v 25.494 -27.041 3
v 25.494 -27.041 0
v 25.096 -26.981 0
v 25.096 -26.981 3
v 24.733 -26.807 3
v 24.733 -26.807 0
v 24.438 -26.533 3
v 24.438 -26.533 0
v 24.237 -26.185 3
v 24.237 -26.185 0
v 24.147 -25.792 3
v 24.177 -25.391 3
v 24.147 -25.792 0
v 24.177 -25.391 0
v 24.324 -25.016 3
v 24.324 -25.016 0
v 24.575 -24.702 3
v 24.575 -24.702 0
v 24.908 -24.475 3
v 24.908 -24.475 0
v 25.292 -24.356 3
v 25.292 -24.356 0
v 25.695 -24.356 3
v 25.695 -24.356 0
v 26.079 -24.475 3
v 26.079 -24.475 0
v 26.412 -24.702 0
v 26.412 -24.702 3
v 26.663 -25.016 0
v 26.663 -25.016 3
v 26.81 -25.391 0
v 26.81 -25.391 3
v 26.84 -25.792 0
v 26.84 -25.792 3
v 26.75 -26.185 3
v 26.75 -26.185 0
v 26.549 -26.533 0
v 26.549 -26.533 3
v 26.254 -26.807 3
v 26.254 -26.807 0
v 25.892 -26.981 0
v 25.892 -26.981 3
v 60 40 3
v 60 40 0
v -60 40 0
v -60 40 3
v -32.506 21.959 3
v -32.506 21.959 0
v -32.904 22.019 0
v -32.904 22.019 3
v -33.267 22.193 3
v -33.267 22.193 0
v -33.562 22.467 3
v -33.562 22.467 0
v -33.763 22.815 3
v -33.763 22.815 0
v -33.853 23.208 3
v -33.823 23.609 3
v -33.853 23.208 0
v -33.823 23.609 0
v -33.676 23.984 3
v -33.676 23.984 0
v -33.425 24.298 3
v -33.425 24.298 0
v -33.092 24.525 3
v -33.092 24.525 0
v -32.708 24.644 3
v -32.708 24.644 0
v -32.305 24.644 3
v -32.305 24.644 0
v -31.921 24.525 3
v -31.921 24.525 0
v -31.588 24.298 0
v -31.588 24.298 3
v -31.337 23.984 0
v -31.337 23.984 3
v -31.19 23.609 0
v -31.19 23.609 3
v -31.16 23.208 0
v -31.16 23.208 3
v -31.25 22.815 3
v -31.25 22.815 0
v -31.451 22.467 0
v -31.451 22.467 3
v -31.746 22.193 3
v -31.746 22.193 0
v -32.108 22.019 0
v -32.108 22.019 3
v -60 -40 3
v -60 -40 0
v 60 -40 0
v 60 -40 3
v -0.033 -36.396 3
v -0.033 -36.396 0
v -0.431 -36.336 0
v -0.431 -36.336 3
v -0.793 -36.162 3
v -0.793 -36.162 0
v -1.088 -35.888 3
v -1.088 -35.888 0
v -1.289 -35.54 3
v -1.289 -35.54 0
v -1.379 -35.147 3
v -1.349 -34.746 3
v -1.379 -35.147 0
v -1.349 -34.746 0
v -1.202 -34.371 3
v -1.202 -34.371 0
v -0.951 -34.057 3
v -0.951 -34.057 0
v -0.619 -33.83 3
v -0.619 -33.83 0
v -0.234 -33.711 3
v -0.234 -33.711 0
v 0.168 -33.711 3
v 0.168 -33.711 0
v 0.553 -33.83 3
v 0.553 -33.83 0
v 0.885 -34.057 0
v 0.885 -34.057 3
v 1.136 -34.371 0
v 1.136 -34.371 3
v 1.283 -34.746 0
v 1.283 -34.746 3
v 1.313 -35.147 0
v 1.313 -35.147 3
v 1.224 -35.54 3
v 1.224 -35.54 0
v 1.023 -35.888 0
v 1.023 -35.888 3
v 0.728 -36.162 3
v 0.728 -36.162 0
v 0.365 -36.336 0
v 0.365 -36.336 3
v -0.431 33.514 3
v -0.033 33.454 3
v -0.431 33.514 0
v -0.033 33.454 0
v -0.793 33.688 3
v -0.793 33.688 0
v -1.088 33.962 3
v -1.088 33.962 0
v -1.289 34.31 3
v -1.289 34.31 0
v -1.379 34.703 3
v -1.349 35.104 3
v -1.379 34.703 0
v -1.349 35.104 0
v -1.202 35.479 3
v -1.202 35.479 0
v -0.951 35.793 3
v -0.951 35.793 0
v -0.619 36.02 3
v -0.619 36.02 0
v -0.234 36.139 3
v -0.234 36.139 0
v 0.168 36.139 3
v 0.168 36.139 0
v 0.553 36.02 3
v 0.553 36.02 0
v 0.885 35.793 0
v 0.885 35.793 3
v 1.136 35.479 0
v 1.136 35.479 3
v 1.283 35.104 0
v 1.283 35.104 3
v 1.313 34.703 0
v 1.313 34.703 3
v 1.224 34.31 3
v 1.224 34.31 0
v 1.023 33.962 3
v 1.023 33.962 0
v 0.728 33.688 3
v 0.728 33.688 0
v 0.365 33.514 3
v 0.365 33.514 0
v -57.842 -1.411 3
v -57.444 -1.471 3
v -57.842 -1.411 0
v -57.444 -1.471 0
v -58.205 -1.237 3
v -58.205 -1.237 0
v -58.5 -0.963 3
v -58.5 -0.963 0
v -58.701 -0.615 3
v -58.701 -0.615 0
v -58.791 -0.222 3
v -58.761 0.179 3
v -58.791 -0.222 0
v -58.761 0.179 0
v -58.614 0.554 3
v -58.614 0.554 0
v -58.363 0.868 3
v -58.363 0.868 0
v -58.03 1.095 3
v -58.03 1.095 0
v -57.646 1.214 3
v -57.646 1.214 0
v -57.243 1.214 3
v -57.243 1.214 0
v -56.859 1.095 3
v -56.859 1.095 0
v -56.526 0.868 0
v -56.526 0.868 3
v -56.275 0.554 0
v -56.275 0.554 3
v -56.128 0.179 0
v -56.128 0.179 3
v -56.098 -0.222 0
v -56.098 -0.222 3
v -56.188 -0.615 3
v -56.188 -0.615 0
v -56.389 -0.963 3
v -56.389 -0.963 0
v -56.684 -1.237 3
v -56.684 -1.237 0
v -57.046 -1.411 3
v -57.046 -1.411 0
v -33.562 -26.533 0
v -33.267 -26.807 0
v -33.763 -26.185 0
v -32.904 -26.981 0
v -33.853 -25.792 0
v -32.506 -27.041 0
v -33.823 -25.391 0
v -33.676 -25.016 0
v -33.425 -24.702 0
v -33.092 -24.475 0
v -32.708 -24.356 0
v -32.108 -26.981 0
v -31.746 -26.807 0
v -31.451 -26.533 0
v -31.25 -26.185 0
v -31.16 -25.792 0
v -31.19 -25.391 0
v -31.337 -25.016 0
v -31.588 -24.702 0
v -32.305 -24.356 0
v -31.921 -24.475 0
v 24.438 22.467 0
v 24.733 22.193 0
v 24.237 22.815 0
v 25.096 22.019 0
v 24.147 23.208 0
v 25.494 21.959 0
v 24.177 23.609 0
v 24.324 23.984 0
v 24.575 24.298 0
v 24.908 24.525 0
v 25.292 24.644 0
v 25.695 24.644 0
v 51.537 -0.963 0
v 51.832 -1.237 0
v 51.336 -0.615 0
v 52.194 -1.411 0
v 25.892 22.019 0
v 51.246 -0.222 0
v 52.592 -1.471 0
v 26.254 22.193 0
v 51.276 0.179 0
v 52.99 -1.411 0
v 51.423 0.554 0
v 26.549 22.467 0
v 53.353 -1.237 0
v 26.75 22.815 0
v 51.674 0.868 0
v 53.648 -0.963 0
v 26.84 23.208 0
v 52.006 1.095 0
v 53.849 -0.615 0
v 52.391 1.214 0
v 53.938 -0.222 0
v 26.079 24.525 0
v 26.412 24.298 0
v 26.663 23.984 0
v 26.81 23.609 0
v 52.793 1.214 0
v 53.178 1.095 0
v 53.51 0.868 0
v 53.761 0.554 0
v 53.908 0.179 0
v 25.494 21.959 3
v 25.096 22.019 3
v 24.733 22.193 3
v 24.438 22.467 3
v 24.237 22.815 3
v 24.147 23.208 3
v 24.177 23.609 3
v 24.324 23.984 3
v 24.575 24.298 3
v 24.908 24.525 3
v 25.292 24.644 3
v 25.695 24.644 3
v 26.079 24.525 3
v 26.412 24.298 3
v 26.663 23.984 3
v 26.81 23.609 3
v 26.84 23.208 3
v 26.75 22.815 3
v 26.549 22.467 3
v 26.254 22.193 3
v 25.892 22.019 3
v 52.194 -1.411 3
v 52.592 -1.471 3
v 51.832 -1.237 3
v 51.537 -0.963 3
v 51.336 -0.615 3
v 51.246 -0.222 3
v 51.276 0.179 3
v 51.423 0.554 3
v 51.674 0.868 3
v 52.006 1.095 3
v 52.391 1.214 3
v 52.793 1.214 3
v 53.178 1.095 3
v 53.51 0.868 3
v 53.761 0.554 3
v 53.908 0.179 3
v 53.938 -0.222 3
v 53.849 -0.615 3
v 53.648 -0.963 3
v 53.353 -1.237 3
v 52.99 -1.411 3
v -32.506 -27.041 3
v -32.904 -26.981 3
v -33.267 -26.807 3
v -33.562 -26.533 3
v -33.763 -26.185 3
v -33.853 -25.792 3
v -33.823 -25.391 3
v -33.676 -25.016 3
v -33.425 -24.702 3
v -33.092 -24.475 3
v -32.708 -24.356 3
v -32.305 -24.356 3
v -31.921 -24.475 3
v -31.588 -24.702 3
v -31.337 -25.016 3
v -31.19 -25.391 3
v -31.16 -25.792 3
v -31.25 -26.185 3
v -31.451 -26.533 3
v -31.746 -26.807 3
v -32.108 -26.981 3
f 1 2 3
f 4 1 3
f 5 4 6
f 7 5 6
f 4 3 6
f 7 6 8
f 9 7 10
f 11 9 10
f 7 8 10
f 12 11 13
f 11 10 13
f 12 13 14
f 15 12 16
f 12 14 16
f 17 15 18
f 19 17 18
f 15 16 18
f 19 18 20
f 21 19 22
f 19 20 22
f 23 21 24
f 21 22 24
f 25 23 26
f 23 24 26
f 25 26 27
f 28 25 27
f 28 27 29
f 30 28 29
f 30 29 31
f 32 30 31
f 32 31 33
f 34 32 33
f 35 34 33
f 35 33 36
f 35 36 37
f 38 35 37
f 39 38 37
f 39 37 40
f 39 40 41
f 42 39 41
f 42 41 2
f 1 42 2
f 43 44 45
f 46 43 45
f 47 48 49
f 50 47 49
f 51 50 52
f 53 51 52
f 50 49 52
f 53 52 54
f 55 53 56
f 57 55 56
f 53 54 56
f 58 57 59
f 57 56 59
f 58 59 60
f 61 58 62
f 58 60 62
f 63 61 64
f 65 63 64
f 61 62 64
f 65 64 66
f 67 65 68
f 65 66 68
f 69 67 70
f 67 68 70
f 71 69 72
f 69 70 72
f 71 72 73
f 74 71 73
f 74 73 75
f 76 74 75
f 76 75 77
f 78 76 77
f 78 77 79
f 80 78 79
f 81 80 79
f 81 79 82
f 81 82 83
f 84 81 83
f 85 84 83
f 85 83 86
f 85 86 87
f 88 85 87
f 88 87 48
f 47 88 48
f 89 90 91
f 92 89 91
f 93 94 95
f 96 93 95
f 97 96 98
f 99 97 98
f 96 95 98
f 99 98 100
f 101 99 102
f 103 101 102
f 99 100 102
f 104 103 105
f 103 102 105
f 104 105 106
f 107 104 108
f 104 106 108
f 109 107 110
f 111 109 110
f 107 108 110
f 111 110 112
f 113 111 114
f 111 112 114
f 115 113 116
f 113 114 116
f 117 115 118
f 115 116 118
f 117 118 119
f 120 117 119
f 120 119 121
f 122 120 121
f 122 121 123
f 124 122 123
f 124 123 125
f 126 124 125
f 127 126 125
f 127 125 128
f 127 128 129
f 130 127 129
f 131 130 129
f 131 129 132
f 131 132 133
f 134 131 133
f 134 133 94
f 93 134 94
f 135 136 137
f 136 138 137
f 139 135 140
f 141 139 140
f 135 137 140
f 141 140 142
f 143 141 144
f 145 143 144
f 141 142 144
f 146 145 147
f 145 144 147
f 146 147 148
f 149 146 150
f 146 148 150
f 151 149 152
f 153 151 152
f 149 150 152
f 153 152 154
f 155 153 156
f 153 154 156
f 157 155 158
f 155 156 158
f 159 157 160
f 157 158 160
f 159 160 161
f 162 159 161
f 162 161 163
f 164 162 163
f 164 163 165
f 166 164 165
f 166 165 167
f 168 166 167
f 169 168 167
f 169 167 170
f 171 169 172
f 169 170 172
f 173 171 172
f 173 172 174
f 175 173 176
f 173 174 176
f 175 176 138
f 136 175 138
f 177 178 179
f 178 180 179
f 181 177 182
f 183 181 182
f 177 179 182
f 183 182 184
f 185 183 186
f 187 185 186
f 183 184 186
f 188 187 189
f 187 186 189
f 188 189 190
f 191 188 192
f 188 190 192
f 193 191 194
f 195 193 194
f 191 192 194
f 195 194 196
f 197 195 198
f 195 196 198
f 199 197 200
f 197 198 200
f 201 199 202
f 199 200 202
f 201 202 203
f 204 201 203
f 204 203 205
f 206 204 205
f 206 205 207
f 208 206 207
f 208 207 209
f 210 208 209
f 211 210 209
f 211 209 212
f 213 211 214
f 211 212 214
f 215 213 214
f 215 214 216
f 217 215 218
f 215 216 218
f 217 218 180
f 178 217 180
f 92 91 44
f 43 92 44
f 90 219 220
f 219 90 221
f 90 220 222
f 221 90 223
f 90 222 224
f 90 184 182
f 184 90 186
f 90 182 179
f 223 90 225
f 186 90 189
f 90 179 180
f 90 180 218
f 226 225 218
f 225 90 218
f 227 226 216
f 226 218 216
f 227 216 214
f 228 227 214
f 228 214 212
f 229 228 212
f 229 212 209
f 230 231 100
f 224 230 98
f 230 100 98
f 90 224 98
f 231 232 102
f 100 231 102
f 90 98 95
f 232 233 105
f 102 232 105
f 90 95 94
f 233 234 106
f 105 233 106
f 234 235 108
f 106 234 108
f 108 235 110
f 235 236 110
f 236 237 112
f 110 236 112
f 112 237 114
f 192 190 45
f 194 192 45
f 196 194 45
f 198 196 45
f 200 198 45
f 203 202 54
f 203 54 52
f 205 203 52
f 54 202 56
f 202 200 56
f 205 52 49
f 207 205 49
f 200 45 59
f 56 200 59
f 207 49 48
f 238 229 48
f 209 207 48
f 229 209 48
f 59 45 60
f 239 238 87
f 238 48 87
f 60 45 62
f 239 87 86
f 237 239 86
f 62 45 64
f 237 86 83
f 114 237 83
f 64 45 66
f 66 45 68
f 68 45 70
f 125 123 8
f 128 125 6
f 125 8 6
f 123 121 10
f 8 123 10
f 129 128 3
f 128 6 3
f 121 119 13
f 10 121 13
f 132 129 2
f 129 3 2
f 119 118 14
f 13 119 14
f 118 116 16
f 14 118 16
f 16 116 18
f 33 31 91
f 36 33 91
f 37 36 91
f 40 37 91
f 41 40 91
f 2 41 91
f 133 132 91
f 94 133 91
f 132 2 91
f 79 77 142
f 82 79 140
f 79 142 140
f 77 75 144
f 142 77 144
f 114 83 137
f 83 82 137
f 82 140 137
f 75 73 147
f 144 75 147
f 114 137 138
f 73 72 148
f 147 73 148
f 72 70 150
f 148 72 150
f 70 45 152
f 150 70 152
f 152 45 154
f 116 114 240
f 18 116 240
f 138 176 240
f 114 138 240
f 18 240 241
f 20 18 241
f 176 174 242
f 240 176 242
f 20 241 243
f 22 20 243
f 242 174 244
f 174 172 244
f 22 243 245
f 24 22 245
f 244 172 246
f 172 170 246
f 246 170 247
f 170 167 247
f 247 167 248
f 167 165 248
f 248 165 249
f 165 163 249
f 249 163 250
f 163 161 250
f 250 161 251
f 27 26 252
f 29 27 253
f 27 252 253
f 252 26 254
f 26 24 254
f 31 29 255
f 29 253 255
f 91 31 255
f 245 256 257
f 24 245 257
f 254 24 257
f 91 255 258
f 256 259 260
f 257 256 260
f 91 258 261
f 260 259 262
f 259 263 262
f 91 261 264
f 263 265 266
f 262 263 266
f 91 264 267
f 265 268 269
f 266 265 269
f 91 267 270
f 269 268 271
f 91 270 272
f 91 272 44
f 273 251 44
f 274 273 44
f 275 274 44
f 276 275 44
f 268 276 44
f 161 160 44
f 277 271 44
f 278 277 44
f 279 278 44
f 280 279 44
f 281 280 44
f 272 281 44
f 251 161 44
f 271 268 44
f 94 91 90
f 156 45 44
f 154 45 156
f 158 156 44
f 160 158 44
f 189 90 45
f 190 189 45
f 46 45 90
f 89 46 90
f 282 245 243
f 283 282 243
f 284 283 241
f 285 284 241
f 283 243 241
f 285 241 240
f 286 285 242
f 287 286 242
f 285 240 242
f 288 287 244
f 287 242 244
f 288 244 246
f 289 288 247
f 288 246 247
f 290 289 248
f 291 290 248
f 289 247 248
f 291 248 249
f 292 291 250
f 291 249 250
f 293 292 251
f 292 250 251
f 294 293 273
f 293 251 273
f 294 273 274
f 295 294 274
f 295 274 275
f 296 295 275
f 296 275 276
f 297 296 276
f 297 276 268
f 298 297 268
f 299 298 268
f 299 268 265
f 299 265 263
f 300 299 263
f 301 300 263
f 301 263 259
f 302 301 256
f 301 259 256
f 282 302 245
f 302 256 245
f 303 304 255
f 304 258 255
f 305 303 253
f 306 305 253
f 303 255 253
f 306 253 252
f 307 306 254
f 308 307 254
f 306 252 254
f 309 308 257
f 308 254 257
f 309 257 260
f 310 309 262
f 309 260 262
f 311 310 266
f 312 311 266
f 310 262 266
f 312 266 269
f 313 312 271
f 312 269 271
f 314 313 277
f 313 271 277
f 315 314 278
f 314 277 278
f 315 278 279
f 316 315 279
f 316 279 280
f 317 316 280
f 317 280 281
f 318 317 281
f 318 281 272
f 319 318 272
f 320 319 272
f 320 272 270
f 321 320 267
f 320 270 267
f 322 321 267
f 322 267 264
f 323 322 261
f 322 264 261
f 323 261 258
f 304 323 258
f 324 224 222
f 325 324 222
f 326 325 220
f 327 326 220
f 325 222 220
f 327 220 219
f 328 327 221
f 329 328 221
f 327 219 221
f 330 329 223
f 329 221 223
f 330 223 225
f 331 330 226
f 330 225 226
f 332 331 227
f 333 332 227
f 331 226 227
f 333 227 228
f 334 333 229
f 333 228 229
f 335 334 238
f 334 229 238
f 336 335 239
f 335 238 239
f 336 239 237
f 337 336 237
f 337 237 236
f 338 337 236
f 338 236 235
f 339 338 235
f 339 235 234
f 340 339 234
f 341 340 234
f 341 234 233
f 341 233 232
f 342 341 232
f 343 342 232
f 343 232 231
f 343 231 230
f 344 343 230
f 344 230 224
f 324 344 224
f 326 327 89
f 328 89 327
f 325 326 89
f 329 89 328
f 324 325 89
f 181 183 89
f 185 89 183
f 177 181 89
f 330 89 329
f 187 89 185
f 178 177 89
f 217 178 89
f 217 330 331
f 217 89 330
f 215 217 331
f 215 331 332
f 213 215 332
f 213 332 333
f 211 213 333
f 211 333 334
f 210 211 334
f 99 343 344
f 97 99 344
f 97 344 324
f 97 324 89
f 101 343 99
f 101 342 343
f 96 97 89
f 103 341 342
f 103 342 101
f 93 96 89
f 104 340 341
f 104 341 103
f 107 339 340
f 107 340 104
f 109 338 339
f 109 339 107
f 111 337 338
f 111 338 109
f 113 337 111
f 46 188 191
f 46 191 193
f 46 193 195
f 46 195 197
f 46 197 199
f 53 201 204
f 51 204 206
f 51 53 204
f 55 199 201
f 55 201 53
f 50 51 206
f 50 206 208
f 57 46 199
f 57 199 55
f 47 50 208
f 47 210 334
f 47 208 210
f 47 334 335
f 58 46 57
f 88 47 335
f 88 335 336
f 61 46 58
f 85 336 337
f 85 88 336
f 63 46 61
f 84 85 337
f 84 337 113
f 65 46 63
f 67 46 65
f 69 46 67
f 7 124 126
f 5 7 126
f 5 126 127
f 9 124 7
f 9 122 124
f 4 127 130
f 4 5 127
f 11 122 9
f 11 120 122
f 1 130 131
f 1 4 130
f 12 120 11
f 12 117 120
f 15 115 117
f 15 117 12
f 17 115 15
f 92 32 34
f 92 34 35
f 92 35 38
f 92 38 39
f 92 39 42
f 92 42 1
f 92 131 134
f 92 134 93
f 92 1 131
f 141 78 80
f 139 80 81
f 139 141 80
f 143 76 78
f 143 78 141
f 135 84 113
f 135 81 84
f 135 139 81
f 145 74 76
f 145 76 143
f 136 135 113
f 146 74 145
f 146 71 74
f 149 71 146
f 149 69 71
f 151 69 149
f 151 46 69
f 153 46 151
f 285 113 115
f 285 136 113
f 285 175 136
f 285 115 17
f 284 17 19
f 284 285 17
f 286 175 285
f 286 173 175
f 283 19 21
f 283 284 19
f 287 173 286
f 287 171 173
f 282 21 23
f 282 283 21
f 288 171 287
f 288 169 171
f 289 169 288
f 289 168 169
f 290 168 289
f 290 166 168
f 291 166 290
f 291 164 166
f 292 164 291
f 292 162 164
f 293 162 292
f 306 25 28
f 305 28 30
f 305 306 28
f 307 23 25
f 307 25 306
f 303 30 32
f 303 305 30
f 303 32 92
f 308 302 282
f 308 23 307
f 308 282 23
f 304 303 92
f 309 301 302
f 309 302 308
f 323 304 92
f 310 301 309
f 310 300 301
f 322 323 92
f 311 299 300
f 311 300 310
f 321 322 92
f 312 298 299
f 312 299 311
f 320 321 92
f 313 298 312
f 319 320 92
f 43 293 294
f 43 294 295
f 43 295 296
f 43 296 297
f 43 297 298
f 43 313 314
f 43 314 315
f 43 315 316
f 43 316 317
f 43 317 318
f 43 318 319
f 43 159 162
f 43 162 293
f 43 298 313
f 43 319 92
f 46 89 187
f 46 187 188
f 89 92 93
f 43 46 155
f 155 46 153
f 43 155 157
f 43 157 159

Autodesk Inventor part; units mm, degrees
ref_plane "YZ Plane" through (0, 0, 0) normal (1, 0, 0) x (0, 1, 0)
ref_plane "XZ Plane" through (0, 0, 0) normal (0, 1, 0) x (-1, 0, 0)
ref_plane "XY Plane" through (0, 0, 0) normal (0, 0, 1) x (1, 0, 0)
sketch "Sketch1" plane through (0, 0, 0) normal (0, 0, 1) x (1, 0, 0)
  line L0 (-60, -40) -> (60, -40)
  line L1 (60, -40) -> (60, 40)
  line L2 (60, 40) -> (-60, 40)
  line L3 (-60, 40) -> (-60, -40)
  line L4 (-60, -40) -> (60, 40) construction
  line L5 (60, -40) -> (-60, 40) construction
  line L6 (60, 0) -> (-60, 0)
  line L7 (0, -40) -> (0, 40)
  point P0 (0, 0)
  dimension "d0" = 120
  dimension "d1" = 80
extrude "Extrusion1" add sketch "Sketch1" along normal blind 3
sketch "Sketch2" plane through (0, 0, 3) normal (0, 0, 1) x (1, 0, 0)
  circle A0 centre (-0.0328, 34.8037) radius 1.35
  circle A1 centre (-0.0328, -35.0463) radius 1.35
  circle A2 centre (52.5922, -0.1213) radius 1.35
  circle A3 centre (25.4936, 23.3086) radius 1.35
  circle A4 centre (25.4936, -25.6914) radius 1.35
  circle A5 centre (-32.5064, -25.6914) radius 1.35
  circle A6 centre (-32.5064, 23.3086) radius 1.35
  circle A7 centre (-57.4444, -0.1213) radius 1.35
  point P0 (0, 0)
  point P1 (-0.0328, -0.1213)
hole "Hole1" at (-0.0328, 34.8037, 3) at (-32.5064, 23.3086, 3) at (-57.4444, -0.1213, 3) at (-32.5064, -25.6914, 3) at (-0.0328, -35.0463, 3) at (25.4936, -25.6914, 3) at (52.5922, -0.1213, 3) at (25.4936, 23.3086, 3) direction (0, 0, -1) diameter 2.7 end through all
properties part number "plate"
